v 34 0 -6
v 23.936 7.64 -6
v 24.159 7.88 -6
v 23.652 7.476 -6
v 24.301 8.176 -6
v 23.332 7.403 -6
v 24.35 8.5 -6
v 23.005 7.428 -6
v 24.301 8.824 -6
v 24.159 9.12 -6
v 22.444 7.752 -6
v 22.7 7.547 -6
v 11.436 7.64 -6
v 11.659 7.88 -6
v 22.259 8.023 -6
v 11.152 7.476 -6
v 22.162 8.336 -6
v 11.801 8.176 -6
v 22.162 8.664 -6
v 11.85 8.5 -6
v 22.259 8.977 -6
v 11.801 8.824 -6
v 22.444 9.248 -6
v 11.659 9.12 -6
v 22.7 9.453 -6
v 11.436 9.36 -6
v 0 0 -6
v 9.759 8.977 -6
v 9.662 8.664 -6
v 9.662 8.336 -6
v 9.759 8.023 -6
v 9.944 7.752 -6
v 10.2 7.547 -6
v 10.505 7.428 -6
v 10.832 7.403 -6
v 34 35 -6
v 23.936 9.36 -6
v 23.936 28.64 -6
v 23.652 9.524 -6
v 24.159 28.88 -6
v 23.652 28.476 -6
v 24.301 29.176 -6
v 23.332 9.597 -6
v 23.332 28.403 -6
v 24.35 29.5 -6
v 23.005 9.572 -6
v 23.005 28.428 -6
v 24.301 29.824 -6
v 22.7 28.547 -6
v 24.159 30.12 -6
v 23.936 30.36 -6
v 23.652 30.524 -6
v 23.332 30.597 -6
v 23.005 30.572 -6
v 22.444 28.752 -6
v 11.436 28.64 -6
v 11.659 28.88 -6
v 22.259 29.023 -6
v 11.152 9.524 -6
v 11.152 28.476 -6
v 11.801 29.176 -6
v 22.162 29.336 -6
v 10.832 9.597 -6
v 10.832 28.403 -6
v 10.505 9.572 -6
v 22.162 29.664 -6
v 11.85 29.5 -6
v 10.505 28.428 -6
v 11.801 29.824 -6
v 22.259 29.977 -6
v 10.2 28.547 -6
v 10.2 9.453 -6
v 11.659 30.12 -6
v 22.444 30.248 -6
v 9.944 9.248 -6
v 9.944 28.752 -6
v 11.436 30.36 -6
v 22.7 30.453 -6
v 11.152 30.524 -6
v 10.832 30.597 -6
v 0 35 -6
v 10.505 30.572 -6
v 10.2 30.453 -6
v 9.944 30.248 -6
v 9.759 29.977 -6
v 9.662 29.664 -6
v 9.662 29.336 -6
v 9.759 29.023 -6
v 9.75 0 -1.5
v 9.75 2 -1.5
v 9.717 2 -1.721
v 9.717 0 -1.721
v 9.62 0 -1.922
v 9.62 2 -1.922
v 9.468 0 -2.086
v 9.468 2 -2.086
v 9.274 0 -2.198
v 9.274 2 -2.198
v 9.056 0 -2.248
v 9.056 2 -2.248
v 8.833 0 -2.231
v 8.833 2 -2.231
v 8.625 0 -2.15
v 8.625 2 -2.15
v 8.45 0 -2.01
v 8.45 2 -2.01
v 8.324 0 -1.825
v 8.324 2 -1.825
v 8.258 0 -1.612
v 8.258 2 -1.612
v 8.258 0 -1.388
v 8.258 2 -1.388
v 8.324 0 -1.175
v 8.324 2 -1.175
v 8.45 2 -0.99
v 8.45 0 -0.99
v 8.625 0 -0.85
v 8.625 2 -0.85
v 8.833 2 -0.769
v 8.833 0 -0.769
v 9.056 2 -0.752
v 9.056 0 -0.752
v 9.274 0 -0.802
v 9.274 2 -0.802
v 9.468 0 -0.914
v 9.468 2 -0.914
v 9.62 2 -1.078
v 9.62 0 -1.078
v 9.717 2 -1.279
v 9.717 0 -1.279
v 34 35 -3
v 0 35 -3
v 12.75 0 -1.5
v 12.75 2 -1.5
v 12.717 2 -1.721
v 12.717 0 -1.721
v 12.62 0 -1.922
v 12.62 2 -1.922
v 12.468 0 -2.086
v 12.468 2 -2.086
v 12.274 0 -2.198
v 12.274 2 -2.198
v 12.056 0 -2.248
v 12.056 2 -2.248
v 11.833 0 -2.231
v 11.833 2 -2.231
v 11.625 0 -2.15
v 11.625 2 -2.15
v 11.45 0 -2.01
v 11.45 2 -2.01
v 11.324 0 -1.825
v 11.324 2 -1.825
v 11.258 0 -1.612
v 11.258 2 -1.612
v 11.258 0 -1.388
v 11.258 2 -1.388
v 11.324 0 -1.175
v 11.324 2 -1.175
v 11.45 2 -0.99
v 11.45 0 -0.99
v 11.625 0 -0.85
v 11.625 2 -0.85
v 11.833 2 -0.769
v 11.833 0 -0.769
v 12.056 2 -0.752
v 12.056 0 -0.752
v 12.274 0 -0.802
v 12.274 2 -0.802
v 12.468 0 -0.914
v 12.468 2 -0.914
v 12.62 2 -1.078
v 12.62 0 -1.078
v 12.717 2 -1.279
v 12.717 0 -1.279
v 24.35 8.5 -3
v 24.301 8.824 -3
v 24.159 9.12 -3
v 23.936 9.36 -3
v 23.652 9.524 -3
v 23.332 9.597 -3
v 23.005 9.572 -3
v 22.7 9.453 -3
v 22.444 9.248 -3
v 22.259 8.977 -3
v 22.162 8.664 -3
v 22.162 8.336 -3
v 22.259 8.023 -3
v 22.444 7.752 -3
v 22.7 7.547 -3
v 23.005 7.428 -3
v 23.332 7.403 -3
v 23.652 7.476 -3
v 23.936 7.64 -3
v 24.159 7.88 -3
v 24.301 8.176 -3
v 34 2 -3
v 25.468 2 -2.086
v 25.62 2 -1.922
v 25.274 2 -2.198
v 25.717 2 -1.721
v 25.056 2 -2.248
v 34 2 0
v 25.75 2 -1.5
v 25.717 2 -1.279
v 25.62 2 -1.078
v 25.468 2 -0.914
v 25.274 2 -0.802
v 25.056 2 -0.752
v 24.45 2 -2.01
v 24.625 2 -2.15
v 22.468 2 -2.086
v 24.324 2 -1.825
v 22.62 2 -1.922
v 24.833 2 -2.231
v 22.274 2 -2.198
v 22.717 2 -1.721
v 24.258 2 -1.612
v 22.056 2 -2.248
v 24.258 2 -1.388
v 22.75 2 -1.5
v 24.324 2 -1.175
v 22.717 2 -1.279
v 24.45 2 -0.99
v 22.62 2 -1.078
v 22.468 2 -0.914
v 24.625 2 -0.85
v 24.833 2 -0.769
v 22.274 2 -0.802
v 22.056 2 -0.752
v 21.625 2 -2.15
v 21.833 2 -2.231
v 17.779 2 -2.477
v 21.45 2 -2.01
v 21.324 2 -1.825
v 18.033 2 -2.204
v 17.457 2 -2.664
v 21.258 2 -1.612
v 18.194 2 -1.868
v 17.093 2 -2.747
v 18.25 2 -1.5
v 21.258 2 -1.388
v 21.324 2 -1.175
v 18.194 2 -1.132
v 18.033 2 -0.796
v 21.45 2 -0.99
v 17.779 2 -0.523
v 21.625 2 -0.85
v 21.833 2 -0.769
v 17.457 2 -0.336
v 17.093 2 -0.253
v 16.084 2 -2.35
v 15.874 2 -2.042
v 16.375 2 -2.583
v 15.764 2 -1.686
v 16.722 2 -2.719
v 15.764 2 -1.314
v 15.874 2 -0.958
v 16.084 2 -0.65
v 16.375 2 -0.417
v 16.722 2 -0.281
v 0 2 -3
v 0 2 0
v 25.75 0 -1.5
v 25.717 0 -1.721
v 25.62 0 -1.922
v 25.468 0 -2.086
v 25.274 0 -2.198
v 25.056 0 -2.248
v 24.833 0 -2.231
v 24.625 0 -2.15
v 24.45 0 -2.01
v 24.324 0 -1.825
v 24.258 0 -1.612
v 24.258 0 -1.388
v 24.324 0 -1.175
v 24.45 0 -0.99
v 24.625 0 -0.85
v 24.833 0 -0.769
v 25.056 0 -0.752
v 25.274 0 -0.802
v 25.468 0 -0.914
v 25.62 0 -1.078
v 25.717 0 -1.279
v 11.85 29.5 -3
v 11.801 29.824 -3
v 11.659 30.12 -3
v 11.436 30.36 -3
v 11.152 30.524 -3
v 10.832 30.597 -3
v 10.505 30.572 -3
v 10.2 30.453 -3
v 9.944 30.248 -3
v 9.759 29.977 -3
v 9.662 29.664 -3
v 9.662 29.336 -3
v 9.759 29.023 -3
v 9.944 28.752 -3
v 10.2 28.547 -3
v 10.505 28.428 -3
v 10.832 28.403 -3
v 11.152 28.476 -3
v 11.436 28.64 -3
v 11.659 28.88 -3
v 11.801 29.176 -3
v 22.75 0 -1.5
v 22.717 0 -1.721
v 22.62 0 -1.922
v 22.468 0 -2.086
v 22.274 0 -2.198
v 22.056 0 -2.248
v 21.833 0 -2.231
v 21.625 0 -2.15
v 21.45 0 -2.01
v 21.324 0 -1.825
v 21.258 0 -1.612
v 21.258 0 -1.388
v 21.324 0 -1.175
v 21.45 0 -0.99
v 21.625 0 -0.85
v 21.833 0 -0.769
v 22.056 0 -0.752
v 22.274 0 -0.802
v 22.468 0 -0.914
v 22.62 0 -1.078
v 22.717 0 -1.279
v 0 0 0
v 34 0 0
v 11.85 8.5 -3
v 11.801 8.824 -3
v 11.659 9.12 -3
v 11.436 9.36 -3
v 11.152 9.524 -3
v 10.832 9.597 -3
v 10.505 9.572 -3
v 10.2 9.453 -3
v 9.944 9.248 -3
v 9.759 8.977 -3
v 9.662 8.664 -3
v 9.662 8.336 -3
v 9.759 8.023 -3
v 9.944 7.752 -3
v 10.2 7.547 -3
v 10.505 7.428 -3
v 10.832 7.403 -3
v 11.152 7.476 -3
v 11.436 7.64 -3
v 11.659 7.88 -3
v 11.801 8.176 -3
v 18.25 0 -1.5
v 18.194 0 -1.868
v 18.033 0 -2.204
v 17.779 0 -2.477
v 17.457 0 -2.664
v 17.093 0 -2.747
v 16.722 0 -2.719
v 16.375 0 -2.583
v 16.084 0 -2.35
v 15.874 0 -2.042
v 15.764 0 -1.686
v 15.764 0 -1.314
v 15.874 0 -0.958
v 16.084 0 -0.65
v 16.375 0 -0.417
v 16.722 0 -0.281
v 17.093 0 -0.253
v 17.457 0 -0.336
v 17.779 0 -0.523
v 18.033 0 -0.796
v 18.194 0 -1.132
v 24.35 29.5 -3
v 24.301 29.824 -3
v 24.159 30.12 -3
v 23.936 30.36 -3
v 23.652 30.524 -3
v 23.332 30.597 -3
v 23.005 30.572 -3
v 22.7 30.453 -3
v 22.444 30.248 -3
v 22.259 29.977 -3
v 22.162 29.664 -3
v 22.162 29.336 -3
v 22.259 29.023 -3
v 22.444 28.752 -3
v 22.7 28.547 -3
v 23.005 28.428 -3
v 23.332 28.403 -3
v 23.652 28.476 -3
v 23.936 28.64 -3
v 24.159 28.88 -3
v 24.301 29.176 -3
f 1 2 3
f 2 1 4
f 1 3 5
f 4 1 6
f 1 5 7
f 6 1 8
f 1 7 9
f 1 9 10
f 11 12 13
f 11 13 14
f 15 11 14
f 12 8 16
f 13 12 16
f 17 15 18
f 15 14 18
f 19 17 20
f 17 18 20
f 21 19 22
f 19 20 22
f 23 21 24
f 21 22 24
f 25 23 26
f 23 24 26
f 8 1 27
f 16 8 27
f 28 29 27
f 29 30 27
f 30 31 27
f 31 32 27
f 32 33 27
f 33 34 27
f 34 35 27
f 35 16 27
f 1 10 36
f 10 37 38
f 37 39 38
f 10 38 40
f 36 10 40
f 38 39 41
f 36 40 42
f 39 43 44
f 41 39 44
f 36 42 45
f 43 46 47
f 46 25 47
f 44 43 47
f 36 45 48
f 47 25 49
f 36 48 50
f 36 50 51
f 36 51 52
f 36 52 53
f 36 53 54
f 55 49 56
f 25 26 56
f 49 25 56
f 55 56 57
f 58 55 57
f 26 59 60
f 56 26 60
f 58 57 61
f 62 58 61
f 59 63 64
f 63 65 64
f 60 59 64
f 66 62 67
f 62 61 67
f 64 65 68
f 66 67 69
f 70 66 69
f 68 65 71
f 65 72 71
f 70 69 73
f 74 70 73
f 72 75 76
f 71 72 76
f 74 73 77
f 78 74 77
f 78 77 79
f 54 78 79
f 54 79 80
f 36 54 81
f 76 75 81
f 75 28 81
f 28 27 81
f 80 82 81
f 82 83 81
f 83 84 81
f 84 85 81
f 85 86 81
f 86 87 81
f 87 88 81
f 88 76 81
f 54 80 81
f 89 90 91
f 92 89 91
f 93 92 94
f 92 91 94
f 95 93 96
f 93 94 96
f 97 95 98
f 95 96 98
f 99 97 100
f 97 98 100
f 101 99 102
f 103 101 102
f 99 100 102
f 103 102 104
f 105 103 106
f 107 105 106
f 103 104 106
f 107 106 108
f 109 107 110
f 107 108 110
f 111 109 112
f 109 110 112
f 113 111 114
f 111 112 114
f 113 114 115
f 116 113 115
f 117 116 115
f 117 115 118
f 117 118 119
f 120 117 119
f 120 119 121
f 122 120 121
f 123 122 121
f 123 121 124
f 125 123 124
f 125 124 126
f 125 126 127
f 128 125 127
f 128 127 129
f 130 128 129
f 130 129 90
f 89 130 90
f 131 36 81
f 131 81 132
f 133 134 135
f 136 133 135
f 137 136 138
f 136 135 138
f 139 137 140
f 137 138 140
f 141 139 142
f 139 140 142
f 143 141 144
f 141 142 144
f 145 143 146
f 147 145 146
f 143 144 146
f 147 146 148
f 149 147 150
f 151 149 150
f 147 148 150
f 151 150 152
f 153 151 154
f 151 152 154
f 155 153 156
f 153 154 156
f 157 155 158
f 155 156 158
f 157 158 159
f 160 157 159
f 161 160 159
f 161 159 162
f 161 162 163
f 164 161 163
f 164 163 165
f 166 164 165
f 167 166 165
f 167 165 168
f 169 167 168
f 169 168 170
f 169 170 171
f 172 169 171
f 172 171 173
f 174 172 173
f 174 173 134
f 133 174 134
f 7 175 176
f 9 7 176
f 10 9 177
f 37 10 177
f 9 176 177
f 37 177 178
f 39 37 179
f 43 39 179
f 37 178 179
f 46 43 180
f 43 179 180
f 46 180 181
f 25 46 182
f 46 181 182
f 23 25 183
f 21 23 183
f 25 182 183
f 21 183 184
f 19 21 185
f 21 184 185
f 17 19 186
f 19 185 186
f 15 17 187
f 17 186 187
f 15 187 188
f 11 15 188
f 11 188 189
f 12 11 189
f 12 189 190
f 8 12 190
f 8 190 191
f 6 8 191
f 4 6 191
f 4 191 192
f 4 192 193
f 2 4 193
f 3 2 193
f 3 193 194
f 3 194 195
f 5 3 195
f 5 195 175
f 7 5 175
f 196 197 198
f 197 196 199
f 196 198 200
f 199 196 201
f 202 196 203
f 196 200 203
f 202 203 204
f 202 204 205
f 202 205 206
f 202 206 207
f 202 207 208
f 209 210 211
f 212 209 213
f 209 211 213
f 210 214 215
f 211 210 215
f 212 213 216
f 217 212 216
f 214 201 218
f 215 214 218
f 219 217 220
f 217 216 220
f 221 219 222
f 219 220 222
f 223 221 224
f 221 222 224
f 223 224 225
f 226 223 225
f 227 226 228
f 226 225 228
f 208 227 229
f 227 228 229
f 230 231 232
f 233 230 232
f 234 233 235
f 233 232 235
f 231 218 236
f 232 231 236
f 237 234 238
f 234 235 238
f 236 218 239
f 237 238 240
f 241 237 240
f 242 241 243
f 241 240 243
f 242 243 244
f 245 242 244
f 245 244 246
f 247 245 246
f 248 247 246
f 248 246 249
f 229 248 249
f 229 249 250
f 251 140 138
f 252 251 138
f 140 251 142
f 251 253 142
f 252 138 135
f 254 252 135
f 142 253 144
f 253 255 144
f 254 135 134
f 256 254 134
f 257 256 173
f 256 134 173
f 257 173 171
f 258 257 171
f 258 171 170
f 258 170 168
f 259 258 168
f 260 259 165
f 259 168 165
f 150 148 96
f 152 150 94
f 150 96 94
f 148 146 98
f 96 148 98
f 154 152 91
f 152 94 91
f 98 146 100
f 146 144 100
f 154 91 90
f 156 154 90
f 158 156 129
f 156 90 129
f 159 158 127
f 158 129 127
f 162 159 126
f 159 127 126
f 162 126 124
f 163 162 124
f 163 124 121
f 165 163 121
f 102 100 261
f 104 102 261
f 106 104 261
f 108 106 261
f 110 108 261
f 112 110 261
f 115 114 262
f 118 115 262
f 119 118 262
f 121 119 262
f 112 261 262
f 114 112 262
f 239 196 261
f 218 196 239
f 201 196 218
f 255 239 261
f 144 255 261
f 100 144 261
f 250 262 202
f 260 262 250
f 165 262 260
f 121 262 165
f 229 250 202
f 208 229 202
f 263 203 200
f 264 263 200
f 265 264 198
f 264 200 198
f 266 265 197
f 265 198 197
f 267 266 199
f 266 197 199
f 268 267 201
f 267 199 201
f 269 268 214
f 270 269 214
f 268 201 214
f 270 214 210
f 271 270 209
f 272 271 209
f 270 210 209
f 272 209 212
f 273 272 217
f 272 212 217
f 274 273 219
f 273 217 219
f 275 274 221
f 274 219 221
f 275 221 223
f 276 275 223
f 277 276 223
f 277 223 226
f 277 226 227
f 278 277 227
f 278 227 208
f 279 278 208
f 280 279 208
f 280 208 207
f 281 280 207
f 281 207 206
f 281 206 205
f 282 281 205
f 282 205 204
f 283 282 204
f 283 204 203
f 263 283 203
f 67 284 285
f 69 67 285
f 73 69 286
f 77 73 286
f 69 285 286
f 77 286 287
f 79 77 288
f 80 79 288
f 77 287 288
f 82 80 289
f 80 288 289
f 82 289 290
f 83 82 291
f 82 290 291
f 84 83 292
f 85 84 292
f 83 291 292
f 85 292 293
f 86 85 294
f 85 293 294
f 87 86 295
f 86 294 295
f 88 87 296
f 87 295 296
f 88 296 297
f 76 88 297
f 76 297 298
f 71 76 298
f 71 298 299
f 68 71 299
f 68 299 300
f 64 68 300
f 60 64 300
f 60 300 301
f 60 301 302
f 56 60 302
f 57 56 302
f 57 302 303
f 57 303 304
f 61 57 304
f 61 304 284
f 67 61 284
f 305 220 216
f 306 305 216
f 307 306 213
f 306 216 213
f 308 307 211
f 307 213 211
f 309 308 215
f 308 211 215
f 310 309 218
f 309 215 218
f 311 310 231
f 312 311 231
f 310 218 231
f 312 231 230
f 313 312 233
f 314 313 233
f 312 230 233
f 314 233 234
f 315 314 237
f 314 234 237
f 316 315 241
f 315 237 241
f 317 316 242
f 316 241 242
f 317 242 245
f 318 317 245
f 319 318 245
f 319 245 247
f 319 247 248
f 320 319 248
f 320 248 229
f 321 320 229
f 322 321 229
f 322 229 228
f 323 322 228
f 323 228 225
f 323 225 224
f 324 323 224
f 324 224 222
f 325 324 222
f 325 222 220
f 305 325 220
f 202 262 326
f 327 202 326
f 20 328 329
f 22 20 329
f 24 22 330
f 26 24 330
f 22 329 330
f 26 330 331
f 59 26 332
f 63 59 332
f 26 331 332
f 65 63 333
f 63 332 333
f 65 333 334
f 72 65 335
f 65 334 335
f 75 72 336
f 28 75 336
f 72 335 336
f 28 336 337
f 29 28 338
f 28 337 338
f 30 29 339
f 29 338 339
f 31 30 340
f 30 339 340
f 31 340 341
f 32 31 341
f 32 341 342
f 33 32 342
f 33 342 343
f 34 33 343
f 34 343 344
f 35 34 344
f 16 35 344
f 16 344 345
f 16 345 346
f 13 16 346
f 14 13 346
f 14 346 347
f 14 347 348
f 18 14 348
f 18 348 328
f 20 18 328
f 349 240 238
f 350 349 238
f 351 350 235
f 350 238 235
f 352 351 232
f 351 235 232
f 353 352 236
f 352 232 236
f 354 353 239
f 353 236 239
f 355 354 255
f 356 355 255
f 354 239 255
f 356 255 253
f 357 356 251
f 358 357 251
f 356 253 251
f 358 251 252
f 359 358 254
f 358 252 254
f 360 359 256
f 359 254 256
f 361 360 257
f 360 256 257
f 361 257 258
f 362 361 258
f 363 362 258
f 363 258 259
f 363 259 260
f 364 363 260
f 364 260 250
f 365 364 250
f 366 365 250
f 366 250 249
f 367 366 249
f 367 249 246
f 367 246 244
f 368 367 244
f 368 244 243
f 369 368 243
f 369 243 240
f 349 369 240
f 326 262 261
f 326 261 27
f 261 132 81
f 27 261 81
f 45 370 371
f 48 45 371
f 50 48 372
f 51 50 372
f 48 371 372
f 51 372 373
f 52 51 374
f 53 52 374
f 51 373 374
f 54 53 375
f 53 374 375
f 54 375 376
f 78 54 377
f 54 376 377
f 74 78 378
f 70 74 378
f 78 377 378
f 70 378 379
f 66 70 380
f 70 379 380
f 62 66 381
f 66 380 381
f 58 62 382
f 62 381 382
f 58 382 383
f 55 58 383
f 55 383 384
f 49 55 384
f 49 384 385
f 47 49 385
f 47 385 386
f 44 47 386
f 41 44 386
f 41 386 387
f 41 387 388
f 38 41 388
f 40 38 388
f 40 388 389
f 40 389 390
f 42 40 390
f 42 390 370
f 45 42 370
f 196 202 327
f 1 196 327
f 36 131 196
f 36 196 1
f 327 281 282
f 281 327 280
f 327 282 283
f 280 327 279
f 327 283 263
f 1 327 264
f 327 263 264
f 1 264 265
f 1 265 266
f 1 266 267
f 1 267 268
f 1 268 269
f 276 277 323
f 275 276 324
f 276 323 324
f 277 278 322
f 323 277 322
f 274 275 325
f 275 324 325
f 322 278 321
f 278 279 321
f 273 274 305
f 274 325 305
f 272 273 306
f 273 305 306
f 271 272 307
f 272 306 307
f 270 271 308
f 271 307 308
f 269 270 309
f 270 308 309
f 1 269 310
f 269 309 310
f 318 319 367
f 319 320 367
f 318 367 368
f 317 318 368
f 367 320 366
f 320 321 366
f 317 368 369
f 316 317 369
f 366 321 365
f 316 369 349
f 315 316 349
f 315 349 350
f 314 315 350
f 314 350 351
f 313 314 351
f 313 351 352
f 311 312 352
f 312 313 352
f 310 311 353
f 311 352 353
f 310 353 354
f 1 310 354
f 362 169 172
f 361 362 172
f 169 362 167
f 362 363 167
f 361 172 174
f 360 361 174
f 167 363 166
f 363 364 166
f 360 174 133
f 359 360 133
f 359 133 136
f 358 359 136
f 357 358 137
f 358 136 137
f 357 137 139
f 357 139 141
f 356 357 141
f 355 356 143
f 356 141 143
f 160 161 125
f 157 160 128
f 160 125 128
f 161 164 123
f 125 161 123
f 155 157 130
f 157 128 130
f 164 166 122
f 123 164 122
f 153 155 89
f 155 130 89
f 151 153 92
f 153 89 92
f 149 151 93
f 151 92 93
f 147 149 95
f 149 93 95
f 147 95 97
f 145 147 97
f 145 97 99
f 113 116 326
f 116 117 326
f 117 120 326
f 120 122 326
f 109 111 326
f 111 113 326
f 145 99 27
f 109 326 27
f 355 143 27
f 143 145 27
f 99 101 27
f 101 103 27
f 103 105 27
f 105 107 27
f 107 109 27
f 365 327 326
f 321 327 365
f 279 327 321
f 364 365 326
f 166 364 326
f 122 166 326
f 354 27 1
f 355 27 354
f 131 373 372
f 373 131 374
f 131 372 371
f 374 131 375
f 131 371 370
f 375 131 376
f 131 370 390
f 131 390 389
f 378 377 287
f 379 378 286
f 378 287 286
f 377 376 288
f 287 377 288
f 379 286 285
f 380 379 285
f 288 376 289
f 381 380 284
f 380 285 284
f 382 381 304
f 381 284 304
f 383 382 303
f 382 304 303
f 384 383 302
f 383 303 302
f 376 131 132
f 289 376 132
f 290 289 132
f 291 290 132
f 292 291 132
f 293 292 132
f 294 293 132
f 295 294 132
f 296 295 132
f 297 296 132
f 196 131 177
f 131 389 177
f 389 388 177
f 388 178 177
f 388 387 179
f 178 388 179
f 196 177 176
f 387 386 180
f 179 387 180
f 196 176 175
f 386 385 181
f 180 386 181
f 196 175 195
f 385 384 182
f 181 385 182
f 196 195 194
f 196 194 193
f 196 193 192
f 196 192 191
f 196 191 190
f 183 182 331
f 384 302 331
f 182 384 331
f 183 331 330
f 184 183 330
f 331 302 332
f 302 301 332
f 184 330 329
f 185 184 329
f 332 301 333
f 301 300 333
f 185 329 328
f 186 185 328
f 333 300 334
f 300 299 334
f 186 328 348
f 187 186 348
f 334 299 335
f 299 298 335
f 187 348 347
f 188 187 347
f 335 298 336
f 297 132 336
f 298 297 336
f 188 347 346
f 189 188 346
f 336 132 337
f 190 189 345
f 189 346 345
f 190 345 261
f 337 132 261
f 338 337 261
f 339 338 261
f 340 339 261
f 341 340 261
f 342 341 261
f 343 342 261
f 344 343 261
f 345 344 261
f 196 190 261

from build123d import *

# Parameters (mm, degrees)
BOSS_EXTRUDE1_DEPTH = 34
SKETCH2_R           = 1.1
CUT_EXTRUDE1_DEPTH  = 4
SKETCH3_R           = 1.25
SKETCH3_R_2         = 0.75
CUT_EXTRUDE2_DEPTH  = 3


with BuildPart() as part:
    # Sketch1 → Boss-Extrude1 (new body)
    with BuildSketch(Plane(origin=(0, 0, 0), x_dir=(0, 0, -1), z_dir=(1, 0, 0))):
        Polygon((0, 0), (6, 0), (6, 35), (3, 35), (3, 2), (0, 2), align=None)
    extrude(amount=BOSS_EXTRUDE1_DEPTH)

    # Sketch2 → Cut-Extrude1 (cut, through all)
    with BuildSketch(Plane.XY.offset(-3)):
        with Locations((23.25, 29.5)):
            Circle(SKETCH2_R)
        with Locations((10.75, 29.5)):
            Circle(SKETCH2_R)
        with Locations((10.75, 8.5)):
            Circle(SKETCH2_R)
        with Locations((23.25, 8.5)):
            Circle(SKETCH2_R)
    extrude(amount=-CUT_EXTRUDE1_DEPTH, mode=Mode.SUBTRACT)

    # Sketch3 → Cut-Extrude2 (cut, through all)
    with BuildSketch(Plane(origin=(0, 2, 0), x_dir=(1, 0, 0), z_dir=(0, 1, 0))):
        with Locations((17, 1.5)):
            Circle(SKETCH3_R)
        with Locations((22, 1.5)):
            Circle(SKETCH3_R_2)
        with Locations((25, 1.5)):
            Circle(SKETCH3_R_2)
        with Locations((12, 1.5)):
            Circle(SKETCH3_R_2)
        with Locations((9, 1.5)):
            Circle(SKETCH3_R_2)
    extrude(amount=-CUT_EXTRUDE2_DEPTH, mode=Mode.SUBTRACT)


solid = part.part
